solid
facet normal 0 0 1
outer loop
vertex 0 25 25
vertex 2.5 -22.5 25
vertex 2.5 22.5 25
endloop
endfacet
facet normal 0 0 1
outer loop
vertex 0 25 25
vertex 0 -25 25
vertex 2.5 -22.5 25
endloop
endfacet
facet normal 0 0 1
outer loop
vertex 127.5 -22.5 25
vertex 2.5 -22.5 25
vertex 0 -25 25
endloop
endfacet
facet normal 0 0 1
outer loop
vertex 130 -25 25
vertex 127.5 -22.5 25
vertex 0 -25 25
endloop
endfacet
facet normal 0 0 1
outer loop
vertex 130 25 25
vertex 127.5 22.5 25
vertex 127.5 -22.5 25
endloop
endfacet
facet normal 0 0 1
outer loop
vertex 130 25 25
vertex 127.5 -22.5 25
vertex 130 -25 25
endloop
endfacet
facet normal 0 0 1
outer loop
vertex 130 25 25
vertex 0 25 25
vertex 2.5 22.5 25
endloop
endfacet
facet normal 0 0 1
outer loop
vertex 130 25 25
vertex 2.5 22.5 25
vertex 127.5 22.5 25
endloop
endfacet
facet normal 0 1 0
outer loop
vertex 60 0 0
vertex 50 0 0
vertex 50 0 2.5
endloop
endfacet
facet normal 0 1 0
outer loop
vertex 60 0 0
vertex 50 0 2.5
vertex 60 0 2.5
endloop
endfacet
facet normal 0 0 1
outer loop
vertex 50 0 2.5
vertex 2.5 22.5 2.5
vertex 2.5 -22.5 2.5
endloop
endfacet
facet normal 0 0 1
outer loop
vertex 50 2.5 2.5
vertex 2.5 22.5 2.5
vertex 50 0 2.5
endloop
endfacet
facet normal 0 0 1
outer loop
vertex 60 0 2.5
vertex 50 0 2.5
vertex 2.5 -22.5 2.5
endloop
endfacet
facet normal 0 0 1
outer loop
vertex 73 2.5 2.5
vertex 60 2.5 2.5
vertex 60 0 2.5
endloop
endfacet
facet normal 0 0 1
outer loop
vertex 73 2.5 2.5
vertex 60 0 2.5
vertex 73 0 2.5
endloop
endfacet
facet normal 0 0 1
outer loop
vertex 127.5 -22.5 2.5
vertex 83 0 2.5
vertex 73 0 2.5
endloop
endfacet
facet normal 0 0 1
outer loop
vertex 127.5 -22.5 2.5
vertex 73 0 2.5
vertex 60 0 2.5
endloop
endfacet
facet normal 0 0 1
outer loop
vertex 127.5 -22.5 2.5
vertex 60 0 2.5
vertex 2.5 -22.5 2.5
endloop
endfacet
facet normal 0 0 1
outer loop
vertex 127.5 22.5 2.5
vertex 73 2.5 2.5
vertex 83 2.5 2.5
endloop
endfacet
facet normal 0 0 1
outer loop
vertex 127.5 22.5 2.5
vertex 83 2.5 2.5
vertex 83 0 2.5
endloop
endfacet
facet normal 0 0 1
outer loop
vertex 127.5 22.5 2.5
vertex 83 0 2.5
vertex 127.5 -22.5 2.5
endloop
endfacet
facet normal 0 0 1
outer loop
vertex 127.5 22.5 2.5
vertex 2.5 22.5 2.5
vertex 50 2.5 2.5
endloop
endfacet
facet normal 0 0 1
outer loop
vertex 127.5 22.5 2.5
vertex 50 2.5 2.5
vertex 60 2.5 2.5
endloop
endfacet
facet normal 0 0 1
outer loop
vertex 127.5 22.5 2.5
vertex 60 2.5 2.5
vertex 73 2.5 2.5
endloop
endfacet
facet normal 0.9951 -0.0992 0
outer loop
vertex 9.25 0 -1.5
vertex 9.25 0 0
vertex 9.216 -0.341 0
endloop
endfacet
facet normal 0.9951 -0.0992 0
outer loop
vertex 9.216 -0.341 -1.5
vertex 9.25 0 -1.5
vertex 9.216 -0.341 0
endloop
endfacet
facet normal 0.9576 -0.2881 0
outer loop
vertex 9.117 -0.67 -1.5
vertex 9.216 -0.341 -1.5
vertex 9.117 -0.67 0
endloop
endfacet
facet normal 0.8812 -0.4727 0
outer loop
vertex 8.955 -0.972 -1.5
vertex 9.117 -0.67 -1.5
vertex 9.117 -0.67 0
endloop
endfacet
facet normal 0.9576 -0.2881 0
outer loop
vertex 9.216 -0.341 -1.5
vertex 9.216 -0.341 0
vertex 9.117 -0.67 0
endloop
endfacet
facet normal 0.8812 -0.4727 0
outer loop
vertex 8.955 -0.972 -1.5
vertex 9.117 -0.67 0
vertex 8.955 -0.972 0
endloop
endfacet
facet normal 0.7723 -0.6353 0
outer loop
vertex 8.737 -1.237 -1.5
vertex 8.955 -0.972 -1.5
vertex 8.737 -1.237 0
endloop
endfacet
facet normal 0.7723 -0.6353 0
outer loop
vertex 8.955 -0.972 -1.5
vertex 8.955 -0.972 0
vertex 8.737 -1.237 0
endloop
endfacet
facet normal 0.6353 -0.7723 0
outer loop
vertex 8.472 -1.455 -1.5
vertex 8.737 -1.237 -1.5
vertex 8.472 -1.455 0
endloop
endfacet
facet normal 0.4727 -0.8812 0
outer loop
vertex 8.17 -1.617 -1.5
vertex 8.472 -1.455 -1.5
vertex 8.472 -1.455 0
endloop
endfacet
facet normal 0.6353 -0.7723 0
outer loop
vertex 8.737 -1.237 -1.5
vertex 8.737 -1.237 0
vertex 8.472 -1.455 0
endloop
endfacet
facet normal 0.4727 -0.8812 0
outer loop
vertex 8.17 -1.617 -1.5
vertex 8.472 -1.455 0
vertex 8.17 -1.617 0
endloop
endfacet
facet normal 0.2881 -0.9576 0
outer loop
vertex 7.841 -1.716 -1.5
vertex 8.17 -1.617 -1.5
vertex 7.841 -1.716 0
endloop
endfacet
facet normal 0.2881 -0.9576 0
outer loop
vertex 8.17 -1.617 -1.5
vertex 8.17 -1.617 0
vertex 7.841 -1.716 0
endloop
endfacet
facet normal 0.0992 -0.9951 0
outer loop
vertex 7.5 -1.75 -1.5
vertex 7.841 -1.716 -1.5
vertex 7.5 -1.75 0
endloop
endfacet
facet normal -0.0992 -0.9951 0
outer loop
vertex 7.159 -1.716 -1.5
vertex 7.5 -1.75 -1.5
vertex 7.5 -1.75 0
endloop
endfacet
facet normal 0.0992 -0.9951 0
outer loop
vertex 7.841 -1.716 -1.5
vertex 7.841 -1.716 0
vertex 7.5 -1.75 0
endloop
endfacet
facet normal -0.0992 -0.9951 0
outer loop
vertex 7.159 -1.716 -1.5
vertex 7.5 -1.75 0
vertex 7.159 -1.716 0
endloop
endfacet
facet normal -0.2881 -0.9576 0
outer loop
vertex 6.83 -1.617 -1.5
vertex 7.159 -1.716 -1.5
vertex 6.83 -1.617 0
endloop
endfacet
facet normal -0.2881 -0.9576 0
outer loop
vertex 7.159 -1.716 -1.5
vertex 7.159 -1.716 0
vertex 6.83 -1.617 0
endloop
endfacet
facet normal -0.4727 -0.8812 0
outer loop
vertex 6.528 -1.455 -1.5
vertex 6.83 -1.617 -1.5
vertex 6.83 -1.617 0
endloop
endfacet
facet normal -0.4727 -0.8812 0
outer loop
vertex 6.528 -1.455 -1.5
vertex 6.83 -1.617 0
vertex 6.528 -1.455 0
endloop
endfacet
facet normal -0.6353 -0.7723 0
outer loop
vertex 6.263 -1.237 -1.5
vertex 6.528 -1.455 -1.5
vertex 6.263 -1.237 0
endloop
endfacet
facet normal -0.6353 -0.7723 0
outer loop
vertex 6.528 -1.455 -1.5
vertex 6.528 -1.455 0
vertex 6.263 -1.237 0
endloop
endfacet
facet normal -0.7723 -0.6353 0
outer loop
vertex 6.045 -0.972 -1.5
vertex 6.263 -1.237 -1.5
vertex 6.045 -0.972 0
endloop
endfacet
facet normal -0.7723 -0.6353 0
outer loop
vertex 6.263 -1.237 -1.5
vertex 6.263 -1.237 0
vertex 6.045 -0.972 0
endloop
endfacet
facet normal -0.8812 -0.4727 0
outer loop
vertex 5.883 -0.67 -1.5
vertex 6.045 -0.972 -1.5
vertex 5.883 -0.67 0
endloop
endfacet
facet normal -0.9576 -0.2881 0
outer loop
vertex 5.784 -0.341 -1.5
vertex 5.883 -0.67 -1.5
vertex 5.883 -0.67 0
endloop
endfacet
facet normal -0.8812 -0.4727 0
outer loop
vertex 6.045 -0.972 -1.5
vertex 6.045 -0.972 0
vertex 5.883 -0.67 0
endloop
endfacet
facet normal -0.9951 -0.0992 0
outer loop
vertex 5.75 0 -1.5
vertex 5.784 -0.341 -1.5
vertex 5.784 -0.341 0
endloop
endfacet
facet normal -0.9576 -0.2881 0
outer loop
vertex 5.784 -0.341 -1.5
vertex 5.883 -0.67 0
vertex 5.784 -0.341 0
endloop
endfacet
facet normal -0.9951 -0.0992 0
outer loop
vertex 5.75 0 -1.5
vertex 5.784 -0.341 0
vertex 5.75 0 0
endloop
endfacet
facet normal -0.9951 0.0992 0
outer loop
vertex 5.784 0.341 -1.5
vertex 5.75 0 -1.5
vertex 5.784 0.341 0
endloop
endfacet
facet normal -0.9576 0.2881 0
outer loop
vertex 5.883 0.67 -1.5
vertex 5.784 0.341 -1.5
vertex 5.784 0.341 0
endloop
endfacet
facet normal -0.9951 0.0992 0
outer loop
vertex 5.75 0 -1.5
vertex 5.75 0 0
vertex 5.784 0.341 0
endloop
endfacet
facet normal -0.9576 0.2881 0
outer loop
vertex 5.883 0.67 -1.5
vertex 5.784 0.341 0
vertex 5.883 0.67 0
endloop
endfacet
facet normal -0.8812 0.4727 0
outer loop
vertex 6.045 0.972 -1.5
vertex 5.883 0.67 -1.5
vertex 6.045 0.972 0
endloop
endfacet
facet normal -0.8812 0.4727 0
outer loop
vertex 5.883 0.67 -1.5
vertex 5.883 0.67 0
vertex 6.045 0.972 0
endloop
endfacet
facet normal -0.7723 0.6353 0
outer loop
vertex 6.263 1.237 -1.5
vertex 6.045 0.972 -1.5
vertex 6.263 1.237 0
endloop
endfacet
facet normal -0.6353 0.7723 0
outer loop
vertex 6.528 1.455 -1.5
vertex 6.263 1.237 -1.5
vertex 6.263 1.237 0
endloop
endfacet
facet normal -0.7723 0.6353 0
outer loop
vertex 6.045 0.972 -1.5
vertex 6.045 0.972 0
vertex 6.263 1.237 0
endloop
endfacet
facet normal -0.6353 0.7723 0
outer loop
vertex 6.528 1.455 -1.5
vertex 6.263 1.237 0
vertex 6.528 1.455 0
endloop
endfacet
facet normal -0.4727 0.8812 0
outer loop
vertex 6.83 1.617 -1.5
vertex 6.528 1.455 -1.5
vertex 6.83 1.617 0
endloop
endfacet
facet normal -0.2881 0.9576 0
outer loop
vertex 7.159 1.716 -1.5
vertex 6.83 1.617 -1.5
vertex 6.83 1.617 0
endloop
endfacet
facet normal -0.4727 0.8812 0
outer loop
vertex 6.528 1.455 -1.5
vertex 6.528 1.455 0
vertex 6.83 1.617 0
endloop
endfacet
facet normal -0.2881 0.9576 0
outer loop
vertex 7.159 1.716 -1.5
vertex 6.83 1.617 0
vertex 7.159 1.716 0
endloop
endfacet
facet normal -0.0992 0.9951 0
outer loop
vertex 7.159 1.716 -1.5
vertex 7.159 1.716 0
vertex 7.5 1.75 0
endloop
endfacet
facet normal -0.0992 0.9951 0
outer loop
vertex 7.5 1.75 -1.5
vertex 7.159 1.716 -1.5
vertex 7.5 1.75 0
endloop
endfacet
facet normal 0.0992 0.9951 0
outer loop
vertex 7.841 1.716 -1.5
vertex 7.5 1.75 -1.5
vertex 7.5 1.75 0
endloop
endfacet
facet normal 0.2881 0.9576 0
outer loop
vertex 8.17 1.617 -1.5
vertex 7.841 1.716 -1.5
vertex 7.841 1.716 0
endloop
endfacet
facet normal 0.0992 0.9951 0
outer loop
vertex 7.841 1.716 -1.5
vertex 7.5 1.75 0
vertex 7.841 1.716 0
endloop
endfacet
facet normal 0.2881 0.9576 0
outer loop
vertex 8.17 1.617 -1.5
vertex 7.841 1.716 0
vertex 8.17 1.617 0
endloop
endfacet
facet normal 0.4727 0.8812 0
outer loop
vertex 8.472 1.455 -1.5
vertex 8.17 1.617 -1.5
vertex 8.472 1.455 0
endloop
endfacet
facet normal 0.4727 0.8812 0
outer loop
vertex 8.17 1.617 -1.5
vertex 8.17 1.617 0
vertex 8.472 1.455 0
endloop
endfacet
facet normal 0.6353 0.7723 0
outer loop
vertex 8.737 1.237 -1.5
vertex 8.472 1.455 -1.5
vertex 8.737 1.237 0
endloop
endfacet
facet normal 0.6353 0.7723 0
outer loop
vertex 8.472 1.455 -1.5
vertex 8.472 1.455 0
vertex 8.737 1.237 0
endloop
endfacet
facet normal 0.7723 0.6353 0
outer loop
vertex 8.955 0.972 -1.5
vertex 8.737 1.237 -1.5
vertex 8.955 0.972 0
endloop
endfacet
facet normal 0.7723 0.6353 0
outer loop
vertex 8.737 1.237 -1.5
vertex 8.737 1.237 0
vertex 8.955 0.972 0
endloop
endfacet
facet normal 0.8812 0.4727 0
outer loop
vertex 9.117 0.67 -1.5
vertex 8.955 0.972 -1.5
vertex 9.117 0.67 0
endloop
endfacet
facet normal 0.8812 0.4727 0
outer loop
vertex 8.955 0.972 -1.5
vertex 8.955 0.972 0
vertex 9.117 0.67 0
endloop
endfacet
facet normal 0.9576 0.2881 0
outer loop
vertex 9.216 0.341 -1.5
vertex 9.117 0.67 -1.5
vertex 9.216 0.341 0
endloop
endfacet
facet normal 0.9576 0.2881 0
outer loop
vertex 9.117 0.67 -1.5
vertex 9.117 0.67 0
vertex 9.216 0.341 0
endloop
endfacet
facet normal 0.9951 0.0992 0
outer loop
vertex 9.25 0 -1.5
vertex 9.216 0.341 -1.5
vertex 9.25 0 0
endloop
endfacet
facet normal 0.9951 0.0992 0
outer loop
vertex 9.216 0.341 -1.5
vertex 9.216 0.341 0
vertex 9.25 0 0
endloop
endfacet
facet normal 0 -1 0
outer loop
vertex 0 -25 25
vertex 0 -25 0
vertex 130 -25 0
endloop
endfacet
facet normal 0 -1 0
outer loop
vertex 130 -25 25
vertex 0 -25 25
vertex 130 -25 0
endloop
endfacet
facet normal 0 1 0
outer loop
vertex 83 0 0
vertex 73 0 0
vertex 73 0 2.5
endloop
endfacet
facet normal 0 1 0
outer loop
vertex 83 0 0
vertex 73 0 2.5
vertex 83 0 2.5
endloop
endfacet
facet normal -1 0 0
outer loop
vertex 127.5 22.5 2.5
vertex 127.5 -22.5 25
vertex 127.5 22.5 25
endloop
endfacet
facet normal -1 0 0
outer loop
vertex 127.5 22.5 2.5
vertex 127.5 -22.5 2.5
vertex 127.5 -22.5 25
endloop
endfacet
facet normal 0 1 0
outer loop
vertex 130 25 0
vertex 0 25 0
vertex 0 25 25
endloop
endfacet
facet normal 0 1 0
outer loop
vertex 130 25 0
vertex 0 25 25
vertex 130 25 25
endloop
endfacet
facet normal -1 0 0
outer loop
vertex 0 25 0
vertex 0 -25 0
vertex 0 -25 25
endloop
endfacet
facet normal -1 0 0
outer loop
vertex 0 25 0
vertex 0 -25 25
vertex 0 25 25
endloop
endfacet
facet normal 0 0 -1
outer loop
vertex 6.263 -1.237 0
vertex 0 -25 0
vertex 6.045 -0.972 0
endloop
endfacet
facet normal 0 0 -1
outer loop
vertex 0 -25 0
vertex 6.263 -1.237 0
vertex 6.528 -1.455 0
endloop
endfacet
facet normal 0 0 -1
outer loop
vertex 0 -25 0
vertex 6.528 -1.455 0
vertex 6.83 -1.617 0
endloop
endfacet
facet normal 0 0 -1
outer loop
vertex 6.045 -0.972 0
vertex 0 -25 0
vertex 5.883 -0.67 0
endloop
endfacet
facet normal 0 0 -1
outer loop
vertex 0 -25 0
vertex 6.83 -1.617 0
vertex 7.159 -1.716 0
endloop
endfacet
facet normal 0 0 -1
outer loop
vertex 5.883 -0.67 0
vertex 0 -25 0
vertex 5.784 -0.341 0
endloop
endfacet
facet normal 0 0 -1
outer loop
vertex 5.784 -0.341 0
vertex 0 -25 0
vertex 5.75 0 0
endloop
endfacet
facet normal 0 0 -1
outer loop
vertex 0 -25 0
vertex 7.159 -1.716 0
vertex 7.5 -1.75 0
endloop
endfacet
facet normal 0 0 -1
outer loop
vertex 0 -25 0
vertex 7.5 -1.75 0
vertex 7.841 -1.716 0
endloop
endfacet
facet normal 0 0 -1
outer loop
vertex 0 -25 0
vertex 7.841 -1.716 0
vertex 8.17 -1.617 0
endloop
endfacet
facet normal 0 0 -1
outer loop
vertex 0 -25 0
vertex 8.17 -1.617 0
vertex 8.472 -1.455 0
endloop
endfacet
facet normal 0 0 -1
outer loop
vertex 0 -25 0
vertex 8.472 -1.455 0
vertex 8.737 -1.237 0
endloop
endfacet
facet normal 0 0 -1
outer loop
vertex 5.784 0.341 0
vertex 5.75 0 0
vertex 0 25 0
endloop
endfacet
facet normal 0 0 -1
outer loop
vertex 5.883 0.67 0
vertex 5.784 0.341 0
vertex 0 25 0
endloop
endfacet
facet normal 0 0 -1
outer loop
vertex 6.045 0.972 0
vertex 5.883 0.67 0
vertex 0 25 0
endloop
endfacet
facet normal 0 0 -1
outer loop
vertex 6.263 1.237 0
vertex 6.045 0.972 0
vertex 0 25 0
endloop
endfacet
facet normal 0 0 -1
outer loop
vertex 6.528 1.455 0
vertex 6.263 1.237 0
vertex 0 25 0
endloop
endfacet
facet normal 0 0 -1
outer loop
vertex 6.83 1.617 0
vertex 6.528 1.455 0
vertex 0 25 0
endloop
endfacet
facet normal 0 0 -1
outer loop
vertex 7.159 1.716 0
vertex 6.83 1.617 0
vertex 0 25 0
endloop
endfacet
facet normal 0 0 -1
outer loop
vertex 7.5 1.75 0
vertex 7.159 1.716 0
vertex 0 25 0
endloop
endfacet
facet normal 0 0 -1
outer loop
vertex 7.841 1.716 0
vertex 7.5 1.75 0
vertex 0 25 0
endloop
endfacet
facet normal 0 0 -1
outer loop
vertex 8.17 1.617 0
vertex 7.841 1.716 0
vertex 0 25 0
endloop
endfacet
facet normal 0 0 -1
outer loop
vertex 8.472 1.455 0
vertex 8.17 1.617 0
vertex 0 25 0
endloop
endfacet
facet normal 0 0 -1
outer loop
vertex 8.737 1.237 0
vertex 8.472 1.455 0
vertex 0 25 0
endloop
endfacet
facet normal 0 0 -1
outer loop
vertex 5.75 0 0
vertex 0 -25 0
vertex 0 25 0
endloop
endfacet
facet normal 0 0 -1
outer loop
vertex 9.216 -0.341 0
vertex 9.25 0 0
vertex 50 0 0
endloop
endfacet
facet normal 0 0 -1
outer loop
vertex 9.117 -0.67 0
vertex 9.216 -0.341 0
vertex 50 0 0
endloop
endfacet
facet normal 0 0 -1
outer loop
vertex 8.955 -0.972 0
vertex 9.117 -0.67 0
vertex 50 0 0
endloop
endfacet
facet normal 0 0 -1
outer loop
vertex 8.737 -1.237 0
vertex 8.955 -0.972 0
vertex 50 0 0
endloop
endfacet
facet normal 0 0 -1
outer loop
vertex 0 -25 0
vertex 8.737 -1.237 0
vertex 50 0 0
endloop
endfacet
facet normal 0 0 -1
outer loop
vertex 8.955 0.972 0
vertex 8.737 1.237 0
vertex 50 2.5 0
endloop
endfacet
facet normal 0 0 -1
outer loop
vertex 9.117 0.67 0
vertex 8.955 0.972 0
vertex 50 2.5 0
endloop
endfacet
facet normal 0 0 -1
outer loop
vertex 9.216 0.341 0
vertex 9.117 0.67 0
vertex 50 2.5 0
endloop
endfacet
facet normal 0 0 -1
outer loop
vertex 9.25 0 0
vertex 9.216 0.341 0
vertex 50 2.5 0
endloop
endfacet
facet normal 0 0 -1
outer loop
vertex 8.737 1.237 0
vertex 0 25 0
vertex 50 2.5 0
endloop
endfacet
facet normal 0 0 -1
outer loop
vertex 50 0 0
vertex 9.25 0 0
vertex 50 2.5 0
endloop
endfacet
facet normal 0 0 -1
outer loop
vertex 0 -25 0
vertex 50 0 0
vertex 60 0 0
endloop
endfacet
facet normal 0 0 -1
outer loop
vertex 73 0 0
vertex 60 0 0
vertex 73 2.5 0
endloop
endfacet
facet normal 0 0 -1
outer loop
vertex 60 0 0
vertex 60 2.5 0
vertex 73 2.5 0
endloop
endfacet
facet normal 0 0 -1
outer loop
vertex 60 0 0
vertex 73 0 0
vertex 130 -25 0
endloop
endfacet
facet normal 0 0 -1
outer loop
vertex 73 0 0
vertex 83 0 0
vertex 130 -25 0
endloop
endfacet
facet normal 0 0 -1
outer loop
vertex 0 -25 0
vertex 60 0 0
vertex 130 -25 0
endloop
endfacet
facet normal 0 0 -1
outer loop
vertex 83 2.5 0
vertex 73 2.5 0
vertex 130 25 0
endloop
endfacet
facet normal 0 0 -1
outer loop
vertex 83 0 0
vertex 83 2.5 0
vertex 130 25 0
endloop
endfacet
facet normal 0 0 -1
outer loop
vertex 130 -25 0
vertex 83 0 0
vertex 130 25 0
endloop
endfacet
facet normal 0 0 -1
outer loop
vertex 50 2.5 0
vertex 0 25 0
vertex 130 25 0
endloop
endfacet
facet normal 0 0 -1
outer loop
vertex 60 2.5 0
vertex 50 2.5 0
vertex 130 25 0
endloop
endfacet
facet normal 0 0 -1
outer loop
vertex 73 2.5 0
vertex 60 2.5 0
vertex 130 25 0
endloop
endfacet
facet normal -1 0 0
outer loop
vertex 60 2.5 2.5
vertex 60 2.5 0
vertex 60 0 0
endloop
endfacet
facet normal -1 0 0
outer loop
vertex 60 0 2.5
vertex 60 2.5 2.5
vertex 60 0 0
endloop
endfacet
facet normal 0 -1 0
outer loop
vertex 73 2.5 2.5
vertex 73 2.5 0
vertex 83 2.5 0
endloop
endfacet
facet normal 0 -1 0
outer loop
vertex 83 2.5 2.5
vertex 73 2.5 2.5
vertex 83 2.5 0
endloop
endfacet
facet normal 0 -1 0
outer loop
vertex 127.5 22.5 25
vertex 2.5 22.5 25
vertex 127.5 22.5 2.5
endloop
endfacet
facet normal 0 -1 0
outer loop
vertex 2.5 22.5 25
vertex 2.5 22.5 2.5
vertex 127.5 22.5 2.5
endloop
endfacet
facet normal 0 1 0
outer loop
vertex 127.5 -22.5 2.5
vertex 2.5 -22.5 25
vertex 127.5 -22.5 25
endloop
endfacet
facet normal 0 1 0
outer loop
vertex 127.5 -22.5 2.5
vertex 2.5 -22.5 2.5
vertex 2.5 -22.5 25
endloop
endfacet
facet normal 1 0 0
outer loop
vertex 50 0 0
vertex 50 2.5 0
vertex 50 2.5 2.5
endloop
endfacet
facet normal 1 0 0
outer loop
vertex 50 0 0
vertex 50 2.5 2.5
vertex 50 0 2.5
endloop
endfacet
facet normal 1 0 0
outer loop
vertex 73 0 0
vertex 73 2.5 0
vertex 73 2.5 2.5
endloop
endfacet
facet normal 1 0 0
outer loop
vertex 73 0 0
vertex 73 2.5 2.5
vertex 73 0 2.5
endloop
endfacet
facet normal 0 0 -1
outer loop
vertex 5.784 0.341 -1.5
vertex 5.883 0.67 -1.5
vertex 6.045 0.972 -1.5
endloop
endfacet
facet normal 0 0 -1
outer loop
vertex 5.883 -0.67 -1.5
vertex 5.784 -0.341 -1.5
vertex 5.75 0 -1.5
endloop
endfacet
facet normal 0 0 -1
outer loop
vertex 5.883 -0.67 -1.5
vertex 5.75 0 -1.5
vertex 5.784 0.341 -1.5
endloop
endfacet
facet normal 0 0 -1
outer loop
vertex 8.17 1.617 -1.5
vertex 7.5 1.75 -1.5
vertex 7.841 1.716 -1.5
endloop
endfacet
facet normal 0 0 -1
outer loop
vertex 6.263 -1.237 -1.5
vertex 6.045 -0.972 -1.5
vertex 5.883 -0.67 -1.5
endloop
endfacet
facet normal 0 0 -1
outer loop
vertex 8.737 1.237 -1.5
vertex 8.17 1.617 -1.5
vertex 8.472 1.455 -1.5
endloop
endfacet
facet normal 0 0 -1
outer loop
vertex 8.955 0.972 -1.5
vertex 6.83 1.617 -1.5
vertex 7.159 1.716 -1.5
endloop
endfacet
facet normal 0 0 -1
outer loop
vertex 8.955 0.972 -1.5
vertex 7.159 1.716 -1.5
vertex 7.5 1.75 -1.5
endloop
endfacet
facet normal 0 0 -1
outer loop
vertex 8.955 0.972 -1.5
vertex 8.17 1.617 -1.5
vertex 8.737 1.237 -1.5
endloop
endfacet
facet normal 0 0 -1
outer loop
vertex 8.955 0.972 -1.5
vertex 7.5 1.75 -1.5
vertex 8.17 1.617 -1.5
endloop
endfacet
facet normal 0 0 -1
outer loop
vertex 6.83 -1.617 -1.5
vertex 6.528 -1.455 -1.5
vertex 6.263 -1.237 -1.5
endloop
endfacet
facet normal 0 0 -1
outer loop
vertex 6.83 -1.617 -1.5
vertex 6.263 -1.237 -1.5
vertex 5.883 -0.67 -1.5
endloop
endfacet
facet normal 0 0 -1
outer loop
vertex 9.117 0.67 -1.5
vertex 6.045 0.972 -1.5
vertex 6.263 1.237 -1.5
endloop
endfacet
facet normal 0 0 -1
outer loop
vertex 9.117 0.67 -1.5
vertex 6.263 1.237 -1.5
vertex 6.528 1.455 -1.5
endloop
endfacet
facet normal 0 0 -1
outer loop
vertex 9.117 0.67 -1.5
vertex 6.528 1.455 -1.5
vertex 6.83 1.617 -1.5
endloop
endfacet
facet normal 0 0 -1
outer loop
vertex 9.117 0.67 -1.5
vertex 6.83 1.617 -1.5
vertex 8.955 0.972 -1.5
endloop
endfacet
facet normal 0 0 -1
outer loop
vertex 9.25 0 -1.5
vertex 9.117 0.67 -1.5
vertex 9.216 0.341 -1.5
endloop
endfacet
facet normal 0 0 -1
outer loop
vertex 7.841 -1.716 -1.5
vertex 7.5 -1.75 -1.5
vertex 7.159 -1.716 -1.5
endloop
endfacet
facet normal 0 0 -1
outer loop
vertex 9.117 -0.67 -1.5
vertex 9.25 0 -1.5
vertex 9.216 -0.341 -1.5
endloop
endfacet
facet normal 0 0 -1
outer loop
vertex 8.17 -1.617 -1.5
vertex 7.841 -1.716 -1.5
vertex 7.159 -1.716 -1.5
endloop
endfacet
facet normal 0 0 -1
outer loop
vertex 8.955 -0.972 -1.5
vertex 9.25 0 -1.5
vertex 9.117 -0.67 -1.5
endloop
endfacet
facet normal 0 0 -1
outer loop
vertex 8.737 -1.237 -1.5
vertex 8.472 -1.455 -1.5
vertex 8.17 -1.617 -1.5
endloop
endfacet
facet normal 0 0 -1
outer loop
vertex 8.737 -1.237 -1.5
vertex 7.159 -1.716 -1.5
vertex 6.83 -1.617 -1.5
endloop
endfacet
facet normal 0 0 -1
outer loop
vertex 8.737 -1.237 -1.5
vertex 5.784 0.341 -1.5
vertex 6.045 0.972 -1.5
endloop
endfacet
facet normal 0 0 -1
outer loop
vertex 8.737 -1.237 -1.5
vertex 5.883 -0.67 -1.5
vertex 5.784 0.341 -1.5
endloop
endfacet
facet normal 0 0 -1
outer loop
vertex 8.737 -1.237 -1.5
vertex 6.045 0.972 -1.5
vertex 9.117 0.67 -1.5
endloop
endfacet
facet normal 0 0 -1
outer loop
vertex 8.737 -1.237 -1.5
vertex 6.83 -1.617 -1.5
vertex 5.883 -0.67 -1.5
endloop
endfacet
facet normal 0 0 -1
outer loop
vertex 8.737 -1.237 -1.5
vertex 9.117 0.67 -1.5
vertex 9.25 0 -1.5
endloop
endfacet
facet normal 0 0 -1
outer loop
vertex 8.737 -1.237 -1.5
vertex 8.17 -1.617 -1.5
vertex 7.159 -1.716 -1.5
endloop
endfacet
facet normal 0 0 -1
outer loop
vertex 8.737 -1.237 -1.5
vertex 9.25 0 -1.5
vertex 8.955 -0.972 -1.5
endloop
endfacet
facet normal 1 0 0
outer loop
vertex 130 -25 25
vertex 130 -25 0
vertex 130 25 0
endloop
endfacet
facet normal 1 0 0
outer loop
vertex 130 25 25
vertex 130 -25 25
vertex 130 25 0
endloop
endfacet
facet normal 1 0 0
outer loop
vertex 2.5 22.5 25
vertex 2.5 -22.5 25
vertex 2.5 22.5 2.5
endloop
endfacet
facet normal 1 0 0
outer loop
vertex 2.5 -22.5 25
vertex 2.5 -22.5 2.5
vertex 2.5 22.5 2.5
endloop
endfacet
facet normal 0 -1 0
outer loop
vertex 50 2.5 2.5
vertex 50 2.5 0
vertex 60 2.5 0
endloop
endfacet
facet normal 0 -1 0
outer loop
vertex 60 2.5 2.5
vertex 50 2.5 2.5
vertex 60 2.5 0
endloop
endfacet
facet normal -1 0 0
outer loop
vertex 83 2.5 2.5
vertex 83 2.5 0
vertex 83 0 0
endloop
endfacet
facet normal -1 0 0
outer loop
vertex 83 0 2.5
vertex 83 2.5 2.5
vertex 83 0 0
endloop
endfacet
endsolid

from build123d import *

# Parameters (mm, degrees)
F0_W     = 130
F0_H     = 50
F1_DEPTH = 25
F2_T     = -2.5
F3_R     = 1.75
F4_DEPTH = 1.5
F5_W     = 10
F5_H     = 2.5
F6_DEPTH = 2.5


with BuildPart() as f1:
    # F0 (on Top) → F1 (new body)
    with BuildSketch(Plane.XY):
        with Locations((65, 0)):
            Rectangle(F0_W, F0_H)
    extrude(amount=F1_DEPTH)

    # F2
    f2_openings = [f1.faces().sort_by_distance(p)[0] for p in [
        (65, 0, 25),
    ]]
    offset(amount=F2_T, openings=f2_openings)

    # F3 (on face) → F4 (join)
    with BuildSketch(Plane(origin=(0, 0, 0), x_dir=(1, 0, 0), z_dir=(0, 0, -1))):
        with Locations((7.5, 0)):
            Circle(F3_R)
    extrude(amount=F4_DEPTH)

    # F5 (on face) → F6 (cut, through all)
    with BuildSketch(Plane(origin=(0, 0, 0), x_dir=(1, 0, 0), z_dir=(0, 0, -1))):
        with Locations((55, -1.25)):
            Rectangle(F5_W, F5_H)
        with Locations((78, -1.25)):
            Rectangle(F5_W, F5_H)
    extrude(amount=-F6_DEPTH, mode=Mode.SUBTRACT)


solid = f1.part
